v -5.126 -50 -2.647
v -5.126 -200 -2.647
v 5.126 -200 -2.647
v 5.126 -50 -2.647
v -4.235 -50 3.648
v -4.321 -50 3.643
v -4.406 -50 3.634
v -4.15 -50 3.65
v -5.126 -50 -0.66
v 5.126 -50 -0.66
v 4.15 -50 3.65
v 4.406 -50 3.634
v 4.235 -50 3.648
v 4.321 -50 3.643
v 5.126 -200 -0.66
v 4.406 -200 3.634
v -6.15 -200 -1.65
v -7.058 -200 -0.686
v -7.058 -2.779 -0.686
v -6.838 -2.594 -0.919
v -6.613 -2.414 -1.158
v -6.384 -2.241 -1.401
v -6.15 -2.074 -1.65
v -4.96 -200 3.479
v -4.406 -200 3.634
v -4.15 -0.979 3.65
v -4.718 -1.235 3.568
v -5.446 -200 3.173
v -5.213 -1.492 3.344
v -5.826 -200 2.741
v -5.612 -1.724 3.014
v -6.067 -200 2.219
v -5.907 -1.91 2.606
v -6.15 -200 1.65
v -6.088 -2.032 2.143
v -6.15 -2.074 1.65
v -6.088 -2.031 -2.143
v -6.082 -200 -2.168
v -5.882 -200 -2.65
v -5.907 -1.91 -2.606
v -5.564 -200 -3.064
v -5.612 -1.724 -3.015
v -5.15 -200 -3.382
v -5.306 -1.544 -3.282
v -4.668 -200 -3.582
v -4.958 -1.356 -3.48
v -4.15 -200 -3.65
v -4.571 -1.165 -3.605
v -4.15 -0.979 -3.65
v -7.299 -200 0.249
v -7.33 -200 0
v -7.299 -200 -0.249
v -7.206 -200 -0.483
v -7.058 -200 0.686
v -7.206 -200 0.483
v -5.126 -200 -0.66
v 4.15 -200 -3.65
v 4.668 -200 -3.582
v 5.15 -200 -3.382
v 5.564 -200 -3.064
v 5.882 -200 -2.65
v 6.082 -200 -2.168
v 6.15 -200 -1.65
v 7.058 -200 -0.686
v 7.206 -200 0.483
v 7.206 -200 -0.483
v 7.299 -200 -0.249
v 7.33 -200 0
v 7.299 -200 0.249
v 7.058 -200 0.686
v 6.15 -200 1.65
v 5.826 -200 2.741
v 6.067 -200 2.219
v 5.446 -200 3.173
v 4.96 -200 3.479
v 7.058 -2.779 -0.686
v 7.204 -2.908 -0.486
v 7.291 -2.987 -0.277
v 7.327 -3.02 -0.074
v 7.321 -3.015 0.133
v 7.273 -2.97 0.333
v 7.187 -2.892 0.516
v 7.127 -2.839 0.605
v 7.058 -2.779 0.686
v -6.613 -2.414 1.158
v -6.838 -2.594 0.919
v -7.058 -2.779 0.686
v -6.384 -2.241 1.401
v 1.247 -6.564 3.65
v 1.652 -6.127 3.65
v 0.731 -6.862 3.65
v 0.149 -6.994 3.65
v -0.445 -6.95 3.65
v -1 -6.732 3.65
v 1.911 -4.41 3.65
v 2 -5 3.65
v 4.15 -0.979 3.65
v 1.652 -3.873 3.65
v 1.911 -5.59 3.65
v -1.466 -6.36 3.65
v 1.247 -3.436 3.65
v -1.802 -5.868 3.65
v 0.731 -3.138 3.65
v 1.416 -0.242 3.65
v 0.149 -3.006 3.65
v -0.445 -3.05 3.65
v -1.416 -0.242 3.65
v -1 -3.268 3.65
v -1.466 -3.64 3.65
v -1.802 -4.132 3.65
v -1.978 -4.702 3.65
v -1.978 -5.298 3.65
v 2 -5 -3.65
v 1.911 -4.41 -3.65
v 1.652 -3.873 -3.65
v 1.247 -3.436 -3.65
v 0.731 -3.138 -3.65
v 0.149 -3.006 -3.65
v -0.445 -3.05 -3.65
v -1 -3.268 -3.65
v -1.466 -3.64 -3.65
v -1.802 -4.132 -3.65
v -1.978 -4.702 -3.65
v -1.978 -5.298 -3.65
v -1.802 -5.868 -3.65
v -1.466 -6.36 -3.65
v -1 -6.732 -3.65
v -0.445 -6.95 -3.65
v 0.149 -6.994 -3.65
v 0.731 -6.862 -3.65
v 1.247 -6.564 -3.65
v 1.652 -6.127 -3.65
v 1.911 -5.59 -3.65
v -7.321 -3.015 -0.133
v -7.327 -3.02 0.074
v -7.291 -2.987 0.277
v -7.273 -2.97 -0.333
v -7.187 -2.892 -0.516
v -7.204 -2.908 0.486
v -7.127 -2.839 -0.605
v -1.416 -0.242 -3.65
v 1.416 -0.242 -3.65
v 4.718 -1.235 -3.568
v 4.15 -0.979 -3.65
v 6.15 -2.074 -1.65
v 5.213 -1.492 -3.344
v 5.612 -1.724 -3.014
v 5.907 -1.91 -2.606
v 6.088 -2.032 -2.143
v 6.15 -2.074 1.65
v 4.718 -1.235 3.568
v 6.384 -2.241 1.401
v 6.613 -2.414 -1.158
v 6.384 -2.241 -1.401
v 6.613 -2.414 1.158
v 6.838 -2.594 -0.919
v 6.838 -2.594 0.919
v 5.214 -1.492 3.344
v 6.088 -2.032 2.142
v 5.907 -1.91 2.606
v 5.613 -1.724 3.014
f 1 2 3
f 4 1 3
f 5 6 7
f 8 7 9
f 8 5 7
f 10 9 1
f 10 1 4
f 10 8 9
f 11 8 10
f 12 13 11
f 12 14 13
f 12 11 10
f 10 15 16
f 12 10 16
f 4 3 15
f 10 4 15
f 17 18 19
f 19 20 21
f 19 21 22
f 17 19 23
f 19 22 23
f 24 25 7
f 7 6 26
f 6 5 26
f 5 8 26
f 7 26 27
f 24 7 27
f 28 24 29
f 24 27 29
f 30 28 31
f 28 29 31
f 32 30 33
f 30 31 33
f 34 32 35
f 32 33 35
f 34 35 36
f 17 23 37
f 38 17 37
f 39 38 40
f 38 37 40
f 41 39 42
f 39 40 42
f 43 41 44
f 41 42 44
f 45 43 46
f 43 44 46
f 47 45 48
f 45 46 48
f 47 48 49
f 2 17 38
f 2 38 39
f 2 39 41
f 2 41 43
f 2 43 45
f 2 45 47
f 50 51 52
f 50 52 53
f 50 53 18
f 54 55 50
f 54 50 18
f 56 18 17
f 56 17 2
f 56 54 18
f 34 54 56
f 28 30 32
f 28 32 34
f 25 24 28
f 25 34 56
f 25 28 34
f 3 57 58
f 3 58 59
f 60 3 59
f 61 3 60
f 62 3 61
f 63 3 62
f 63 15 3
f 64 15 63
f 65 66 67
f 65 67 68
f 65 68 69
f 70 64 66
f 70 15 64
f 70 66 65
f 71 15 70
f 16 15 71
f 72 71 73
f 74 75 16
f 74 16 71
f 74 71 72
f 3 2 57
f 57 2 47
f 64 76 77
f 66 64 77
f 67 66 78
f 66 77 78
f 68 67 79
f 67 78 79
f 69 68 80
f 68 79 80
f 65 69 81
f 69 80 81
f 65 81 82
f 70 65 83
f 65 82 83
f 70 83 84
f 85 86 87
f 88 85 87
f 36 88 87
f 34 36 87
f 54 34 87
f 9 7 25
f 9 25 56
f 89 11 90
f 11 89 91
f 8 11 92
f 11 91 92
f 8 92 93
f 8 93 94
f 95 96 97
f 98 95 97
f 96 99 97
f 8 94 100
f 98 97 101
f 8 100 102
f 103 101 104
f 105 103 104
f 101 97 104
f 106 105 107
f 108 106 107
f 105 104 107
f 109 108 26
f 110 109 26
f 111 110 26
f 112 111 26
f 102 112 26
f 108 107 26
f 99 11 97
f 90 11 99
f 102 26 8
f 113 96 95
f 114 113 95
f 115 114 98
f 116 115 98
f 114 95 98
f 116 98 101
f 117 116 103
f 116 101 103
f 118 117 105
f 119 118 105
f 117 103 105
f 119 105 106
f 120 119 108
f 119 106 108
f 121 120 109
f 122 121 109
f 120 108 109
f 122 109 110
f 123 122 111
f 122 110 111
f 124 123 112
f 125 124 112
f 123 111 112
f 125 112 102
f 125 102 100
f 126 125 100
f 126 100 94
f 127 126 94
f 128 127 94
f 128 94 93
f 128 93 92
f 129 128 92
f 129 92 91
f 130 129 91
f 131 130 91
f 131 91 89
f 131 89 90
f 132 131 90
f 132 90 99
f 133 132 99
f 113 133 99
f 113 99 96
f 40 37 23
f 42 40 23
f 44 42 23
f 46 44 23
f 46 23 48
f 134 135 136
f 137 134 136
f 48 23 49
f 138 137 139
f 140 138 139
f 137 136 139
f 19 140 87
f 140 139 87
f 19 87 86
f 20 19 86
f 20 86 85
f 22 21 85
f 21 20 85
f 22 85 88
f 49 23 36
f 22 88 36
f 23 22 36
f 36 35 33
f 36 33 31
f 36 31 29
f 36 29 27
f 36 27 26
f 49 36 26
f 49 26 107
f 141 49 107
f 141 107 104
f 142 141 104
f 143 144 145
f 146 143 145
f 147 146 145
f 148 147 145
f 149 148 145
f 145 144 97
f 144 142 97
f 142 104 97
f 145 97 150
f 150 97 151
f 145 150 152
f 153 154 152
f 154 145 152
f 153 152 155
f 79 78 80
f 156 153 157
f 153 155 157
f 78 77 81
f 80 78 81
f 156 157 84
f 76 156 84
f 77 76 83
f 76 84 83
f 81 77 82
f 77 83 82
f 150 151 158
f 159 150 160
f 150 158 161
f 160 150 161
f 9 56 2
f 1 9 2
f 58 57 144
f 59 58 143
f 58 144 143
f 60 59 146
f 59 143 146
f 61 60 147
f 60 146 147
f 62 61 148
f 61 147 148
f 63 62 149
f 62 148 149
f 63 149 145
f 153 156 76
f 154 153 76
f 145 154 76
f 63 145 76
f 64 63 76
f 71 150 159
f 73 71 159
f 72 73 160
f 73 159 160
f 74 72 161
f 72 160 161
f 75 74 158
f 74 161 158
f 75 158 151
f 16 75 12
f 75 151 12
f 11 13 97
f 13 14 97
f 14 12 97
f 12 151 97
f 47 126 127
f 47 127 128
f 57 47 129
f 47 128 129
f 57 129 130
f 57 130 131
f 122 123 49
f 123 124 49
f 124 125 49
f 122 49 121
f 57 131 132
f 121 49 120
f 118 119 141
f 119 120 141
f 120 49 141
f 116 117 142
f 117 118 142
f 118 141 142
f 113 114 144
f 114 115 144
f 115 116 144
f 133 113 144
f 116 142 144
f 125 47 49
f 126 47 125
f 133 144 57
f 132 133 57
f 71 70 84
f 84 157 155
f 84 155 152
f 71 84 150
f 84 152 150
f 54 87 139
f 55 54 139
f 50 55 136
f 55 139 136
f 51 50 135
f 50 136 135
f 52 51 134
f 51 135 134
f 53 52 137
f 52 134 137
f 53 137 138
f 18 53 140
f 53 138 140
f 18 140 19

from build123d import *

# Parameters (mm, degrees)
F1_DEPTH = 200
F2_R     = 2
F3_DEPTH = 7.301
F6_DEPTH = 25
F9_DEPTH = 150


# Not quite as in the source:
# - a feature names something its author has since deleted; it is built from what else it names


with BuildPart() as f1:
    # F0 (on Front) → F1 (new body)
    with BuildSketch(Plane.XZ):
        with BuildLine():
            Line((7.0581561667, 0.685534298), (6.15, 1.65))
            ThreePointArc((6.15, 1.65), (5.5642135624, 3.0642135624), (4.15, 3.65))
            Line((4.15, 3.65), (-4.15, 3.65))
            ThreePointArc((-4.15, 3.65), (-5.5642135624, 3.0642135624), (-6.15, 1.65))
            Line((-6.15, 1.65), (-7.0581561667, 0.685534298))
            ThreePointArc((-7.0581561667, 0.685534298), (-7.3301158338, 0), (-7.0581561667, -0.685534298))
            Line((-7.0581561667, -0.685534298), (-6.15, -1.65))
            ThreePointArc((-6.15, -1.65), (-5.5642135624, -3.0642135624), (-4.15, -3.65))
            Line((-4.15, -3.65), (4.15, -3.65))
            ThreePointArc((4.15, -3.65), (5.5642135624, -3.0642135624), (6.15, -1.65))
            Line((6.15, -1.65), (7.0581561667, -0.685534298))
            ThreePointArc((7.0581561667, -0.685534298), (7.3301158338, 0), (7.0581561667, 0.685534298))
        make_face()
        with BuildLine():
            ThreePointArc((5.15, -1.65), (4.8571067812, -2.3571067812), (4.15, -2.65))
            Line((4.15, -2.65), (-4.15, -2.65))
            ThreePointArc((-4.15, -2.65), (-4.8571067812, -2.3571067812), (-5.15, -1.65))
            Line((-5.15, -1.65), (-5.15, 1.65))
            ThreePointArc((-5.15, 1.65), (-4.8571067812, 2.3571067812), (-4.15, 2.65))
            Line((-4.15, 2.65), (4.15, 2.65))
            ThreePointArc((4.15, 2.65), (4.8571067812, 2.3571067812), (5.15, 1.65))
            Line((5.15, 1.65), (5.15, -1.65))
        make_face(mode=Mode.SUBTRACT)
        with BuildLine():
            Line((-4.15, -2.65), (4.15, -2.65))
            ThreePointArc((4.15, -2.65), (4.8571067812, -2.3571067812), (5.15, -1.65))
            Line((5.15, -1.65), (5.15, 1.65))
            ThreePointArc((5.15, 1.65), (4.8571067812, 2.3571067812), (4.15, 2.65))
            Line((4.15, 2.65), (-4.15, 2.65))
            ThreePointArc((-4.15, 2.65), (-4.8571067812, 2.3571067812), (-5.15, 1.65))
            Line((-5.15, 1.65), (-5.15, -1.65))
            ThreePointArc((-5.15, -1.65), (-4.8571067812, -2.3571067812), (-4.15, -2.65))
        make_face()
    extrude(amount=F1_DEPTH)

    # F2 (on face) → F3 (cut, through all)
    with BuildSketch(Plane.XY.offset(3.65)):
        with Locations((0, -5)):
            Circle(F2_R)
    extrude(amount=-F3_DEPTH, mode=Mode.SUBTRACT)

    # F5 (on offset) → F6 (cut)
    with BuildSketch(Plane.XY.offset(4.6)):
        with BuildLine():
            Line((8, -3.7011680724), (8, 3.7011680724))
            Line((8, 3.7011680724), (-8, 3.7011680724))
            Line((-8, 3.7011680724), (-8, -3.7011680724))
            ThreePointArc((-8, -3.7011680724), (0, -0.1482238292), (8, -3.7011680724))
        make_face()
    extrude(amount=-F6_DEPTH, mode=Mode.SUBTRACT)

    # F8 (on offset) → F9 (cut)
    with BuildSketch(Plane.XZ.offset(200)):
        Polygon((-5.1262229681, -2.646596171), (0, -2.646596171), (5.1262229681, -2.646596171), (5.1262229681, -0.6600963534), (4.3867812492, 3.7468392402), (0, 3.7468392402), (-4.3867812492, 3.7468392402), (-5.1262229681, -0.6600963534), align=None)
    extrude(amount=-F9_DEPTH, mode=Mode.SUBTRACT)


solid = f1.part
